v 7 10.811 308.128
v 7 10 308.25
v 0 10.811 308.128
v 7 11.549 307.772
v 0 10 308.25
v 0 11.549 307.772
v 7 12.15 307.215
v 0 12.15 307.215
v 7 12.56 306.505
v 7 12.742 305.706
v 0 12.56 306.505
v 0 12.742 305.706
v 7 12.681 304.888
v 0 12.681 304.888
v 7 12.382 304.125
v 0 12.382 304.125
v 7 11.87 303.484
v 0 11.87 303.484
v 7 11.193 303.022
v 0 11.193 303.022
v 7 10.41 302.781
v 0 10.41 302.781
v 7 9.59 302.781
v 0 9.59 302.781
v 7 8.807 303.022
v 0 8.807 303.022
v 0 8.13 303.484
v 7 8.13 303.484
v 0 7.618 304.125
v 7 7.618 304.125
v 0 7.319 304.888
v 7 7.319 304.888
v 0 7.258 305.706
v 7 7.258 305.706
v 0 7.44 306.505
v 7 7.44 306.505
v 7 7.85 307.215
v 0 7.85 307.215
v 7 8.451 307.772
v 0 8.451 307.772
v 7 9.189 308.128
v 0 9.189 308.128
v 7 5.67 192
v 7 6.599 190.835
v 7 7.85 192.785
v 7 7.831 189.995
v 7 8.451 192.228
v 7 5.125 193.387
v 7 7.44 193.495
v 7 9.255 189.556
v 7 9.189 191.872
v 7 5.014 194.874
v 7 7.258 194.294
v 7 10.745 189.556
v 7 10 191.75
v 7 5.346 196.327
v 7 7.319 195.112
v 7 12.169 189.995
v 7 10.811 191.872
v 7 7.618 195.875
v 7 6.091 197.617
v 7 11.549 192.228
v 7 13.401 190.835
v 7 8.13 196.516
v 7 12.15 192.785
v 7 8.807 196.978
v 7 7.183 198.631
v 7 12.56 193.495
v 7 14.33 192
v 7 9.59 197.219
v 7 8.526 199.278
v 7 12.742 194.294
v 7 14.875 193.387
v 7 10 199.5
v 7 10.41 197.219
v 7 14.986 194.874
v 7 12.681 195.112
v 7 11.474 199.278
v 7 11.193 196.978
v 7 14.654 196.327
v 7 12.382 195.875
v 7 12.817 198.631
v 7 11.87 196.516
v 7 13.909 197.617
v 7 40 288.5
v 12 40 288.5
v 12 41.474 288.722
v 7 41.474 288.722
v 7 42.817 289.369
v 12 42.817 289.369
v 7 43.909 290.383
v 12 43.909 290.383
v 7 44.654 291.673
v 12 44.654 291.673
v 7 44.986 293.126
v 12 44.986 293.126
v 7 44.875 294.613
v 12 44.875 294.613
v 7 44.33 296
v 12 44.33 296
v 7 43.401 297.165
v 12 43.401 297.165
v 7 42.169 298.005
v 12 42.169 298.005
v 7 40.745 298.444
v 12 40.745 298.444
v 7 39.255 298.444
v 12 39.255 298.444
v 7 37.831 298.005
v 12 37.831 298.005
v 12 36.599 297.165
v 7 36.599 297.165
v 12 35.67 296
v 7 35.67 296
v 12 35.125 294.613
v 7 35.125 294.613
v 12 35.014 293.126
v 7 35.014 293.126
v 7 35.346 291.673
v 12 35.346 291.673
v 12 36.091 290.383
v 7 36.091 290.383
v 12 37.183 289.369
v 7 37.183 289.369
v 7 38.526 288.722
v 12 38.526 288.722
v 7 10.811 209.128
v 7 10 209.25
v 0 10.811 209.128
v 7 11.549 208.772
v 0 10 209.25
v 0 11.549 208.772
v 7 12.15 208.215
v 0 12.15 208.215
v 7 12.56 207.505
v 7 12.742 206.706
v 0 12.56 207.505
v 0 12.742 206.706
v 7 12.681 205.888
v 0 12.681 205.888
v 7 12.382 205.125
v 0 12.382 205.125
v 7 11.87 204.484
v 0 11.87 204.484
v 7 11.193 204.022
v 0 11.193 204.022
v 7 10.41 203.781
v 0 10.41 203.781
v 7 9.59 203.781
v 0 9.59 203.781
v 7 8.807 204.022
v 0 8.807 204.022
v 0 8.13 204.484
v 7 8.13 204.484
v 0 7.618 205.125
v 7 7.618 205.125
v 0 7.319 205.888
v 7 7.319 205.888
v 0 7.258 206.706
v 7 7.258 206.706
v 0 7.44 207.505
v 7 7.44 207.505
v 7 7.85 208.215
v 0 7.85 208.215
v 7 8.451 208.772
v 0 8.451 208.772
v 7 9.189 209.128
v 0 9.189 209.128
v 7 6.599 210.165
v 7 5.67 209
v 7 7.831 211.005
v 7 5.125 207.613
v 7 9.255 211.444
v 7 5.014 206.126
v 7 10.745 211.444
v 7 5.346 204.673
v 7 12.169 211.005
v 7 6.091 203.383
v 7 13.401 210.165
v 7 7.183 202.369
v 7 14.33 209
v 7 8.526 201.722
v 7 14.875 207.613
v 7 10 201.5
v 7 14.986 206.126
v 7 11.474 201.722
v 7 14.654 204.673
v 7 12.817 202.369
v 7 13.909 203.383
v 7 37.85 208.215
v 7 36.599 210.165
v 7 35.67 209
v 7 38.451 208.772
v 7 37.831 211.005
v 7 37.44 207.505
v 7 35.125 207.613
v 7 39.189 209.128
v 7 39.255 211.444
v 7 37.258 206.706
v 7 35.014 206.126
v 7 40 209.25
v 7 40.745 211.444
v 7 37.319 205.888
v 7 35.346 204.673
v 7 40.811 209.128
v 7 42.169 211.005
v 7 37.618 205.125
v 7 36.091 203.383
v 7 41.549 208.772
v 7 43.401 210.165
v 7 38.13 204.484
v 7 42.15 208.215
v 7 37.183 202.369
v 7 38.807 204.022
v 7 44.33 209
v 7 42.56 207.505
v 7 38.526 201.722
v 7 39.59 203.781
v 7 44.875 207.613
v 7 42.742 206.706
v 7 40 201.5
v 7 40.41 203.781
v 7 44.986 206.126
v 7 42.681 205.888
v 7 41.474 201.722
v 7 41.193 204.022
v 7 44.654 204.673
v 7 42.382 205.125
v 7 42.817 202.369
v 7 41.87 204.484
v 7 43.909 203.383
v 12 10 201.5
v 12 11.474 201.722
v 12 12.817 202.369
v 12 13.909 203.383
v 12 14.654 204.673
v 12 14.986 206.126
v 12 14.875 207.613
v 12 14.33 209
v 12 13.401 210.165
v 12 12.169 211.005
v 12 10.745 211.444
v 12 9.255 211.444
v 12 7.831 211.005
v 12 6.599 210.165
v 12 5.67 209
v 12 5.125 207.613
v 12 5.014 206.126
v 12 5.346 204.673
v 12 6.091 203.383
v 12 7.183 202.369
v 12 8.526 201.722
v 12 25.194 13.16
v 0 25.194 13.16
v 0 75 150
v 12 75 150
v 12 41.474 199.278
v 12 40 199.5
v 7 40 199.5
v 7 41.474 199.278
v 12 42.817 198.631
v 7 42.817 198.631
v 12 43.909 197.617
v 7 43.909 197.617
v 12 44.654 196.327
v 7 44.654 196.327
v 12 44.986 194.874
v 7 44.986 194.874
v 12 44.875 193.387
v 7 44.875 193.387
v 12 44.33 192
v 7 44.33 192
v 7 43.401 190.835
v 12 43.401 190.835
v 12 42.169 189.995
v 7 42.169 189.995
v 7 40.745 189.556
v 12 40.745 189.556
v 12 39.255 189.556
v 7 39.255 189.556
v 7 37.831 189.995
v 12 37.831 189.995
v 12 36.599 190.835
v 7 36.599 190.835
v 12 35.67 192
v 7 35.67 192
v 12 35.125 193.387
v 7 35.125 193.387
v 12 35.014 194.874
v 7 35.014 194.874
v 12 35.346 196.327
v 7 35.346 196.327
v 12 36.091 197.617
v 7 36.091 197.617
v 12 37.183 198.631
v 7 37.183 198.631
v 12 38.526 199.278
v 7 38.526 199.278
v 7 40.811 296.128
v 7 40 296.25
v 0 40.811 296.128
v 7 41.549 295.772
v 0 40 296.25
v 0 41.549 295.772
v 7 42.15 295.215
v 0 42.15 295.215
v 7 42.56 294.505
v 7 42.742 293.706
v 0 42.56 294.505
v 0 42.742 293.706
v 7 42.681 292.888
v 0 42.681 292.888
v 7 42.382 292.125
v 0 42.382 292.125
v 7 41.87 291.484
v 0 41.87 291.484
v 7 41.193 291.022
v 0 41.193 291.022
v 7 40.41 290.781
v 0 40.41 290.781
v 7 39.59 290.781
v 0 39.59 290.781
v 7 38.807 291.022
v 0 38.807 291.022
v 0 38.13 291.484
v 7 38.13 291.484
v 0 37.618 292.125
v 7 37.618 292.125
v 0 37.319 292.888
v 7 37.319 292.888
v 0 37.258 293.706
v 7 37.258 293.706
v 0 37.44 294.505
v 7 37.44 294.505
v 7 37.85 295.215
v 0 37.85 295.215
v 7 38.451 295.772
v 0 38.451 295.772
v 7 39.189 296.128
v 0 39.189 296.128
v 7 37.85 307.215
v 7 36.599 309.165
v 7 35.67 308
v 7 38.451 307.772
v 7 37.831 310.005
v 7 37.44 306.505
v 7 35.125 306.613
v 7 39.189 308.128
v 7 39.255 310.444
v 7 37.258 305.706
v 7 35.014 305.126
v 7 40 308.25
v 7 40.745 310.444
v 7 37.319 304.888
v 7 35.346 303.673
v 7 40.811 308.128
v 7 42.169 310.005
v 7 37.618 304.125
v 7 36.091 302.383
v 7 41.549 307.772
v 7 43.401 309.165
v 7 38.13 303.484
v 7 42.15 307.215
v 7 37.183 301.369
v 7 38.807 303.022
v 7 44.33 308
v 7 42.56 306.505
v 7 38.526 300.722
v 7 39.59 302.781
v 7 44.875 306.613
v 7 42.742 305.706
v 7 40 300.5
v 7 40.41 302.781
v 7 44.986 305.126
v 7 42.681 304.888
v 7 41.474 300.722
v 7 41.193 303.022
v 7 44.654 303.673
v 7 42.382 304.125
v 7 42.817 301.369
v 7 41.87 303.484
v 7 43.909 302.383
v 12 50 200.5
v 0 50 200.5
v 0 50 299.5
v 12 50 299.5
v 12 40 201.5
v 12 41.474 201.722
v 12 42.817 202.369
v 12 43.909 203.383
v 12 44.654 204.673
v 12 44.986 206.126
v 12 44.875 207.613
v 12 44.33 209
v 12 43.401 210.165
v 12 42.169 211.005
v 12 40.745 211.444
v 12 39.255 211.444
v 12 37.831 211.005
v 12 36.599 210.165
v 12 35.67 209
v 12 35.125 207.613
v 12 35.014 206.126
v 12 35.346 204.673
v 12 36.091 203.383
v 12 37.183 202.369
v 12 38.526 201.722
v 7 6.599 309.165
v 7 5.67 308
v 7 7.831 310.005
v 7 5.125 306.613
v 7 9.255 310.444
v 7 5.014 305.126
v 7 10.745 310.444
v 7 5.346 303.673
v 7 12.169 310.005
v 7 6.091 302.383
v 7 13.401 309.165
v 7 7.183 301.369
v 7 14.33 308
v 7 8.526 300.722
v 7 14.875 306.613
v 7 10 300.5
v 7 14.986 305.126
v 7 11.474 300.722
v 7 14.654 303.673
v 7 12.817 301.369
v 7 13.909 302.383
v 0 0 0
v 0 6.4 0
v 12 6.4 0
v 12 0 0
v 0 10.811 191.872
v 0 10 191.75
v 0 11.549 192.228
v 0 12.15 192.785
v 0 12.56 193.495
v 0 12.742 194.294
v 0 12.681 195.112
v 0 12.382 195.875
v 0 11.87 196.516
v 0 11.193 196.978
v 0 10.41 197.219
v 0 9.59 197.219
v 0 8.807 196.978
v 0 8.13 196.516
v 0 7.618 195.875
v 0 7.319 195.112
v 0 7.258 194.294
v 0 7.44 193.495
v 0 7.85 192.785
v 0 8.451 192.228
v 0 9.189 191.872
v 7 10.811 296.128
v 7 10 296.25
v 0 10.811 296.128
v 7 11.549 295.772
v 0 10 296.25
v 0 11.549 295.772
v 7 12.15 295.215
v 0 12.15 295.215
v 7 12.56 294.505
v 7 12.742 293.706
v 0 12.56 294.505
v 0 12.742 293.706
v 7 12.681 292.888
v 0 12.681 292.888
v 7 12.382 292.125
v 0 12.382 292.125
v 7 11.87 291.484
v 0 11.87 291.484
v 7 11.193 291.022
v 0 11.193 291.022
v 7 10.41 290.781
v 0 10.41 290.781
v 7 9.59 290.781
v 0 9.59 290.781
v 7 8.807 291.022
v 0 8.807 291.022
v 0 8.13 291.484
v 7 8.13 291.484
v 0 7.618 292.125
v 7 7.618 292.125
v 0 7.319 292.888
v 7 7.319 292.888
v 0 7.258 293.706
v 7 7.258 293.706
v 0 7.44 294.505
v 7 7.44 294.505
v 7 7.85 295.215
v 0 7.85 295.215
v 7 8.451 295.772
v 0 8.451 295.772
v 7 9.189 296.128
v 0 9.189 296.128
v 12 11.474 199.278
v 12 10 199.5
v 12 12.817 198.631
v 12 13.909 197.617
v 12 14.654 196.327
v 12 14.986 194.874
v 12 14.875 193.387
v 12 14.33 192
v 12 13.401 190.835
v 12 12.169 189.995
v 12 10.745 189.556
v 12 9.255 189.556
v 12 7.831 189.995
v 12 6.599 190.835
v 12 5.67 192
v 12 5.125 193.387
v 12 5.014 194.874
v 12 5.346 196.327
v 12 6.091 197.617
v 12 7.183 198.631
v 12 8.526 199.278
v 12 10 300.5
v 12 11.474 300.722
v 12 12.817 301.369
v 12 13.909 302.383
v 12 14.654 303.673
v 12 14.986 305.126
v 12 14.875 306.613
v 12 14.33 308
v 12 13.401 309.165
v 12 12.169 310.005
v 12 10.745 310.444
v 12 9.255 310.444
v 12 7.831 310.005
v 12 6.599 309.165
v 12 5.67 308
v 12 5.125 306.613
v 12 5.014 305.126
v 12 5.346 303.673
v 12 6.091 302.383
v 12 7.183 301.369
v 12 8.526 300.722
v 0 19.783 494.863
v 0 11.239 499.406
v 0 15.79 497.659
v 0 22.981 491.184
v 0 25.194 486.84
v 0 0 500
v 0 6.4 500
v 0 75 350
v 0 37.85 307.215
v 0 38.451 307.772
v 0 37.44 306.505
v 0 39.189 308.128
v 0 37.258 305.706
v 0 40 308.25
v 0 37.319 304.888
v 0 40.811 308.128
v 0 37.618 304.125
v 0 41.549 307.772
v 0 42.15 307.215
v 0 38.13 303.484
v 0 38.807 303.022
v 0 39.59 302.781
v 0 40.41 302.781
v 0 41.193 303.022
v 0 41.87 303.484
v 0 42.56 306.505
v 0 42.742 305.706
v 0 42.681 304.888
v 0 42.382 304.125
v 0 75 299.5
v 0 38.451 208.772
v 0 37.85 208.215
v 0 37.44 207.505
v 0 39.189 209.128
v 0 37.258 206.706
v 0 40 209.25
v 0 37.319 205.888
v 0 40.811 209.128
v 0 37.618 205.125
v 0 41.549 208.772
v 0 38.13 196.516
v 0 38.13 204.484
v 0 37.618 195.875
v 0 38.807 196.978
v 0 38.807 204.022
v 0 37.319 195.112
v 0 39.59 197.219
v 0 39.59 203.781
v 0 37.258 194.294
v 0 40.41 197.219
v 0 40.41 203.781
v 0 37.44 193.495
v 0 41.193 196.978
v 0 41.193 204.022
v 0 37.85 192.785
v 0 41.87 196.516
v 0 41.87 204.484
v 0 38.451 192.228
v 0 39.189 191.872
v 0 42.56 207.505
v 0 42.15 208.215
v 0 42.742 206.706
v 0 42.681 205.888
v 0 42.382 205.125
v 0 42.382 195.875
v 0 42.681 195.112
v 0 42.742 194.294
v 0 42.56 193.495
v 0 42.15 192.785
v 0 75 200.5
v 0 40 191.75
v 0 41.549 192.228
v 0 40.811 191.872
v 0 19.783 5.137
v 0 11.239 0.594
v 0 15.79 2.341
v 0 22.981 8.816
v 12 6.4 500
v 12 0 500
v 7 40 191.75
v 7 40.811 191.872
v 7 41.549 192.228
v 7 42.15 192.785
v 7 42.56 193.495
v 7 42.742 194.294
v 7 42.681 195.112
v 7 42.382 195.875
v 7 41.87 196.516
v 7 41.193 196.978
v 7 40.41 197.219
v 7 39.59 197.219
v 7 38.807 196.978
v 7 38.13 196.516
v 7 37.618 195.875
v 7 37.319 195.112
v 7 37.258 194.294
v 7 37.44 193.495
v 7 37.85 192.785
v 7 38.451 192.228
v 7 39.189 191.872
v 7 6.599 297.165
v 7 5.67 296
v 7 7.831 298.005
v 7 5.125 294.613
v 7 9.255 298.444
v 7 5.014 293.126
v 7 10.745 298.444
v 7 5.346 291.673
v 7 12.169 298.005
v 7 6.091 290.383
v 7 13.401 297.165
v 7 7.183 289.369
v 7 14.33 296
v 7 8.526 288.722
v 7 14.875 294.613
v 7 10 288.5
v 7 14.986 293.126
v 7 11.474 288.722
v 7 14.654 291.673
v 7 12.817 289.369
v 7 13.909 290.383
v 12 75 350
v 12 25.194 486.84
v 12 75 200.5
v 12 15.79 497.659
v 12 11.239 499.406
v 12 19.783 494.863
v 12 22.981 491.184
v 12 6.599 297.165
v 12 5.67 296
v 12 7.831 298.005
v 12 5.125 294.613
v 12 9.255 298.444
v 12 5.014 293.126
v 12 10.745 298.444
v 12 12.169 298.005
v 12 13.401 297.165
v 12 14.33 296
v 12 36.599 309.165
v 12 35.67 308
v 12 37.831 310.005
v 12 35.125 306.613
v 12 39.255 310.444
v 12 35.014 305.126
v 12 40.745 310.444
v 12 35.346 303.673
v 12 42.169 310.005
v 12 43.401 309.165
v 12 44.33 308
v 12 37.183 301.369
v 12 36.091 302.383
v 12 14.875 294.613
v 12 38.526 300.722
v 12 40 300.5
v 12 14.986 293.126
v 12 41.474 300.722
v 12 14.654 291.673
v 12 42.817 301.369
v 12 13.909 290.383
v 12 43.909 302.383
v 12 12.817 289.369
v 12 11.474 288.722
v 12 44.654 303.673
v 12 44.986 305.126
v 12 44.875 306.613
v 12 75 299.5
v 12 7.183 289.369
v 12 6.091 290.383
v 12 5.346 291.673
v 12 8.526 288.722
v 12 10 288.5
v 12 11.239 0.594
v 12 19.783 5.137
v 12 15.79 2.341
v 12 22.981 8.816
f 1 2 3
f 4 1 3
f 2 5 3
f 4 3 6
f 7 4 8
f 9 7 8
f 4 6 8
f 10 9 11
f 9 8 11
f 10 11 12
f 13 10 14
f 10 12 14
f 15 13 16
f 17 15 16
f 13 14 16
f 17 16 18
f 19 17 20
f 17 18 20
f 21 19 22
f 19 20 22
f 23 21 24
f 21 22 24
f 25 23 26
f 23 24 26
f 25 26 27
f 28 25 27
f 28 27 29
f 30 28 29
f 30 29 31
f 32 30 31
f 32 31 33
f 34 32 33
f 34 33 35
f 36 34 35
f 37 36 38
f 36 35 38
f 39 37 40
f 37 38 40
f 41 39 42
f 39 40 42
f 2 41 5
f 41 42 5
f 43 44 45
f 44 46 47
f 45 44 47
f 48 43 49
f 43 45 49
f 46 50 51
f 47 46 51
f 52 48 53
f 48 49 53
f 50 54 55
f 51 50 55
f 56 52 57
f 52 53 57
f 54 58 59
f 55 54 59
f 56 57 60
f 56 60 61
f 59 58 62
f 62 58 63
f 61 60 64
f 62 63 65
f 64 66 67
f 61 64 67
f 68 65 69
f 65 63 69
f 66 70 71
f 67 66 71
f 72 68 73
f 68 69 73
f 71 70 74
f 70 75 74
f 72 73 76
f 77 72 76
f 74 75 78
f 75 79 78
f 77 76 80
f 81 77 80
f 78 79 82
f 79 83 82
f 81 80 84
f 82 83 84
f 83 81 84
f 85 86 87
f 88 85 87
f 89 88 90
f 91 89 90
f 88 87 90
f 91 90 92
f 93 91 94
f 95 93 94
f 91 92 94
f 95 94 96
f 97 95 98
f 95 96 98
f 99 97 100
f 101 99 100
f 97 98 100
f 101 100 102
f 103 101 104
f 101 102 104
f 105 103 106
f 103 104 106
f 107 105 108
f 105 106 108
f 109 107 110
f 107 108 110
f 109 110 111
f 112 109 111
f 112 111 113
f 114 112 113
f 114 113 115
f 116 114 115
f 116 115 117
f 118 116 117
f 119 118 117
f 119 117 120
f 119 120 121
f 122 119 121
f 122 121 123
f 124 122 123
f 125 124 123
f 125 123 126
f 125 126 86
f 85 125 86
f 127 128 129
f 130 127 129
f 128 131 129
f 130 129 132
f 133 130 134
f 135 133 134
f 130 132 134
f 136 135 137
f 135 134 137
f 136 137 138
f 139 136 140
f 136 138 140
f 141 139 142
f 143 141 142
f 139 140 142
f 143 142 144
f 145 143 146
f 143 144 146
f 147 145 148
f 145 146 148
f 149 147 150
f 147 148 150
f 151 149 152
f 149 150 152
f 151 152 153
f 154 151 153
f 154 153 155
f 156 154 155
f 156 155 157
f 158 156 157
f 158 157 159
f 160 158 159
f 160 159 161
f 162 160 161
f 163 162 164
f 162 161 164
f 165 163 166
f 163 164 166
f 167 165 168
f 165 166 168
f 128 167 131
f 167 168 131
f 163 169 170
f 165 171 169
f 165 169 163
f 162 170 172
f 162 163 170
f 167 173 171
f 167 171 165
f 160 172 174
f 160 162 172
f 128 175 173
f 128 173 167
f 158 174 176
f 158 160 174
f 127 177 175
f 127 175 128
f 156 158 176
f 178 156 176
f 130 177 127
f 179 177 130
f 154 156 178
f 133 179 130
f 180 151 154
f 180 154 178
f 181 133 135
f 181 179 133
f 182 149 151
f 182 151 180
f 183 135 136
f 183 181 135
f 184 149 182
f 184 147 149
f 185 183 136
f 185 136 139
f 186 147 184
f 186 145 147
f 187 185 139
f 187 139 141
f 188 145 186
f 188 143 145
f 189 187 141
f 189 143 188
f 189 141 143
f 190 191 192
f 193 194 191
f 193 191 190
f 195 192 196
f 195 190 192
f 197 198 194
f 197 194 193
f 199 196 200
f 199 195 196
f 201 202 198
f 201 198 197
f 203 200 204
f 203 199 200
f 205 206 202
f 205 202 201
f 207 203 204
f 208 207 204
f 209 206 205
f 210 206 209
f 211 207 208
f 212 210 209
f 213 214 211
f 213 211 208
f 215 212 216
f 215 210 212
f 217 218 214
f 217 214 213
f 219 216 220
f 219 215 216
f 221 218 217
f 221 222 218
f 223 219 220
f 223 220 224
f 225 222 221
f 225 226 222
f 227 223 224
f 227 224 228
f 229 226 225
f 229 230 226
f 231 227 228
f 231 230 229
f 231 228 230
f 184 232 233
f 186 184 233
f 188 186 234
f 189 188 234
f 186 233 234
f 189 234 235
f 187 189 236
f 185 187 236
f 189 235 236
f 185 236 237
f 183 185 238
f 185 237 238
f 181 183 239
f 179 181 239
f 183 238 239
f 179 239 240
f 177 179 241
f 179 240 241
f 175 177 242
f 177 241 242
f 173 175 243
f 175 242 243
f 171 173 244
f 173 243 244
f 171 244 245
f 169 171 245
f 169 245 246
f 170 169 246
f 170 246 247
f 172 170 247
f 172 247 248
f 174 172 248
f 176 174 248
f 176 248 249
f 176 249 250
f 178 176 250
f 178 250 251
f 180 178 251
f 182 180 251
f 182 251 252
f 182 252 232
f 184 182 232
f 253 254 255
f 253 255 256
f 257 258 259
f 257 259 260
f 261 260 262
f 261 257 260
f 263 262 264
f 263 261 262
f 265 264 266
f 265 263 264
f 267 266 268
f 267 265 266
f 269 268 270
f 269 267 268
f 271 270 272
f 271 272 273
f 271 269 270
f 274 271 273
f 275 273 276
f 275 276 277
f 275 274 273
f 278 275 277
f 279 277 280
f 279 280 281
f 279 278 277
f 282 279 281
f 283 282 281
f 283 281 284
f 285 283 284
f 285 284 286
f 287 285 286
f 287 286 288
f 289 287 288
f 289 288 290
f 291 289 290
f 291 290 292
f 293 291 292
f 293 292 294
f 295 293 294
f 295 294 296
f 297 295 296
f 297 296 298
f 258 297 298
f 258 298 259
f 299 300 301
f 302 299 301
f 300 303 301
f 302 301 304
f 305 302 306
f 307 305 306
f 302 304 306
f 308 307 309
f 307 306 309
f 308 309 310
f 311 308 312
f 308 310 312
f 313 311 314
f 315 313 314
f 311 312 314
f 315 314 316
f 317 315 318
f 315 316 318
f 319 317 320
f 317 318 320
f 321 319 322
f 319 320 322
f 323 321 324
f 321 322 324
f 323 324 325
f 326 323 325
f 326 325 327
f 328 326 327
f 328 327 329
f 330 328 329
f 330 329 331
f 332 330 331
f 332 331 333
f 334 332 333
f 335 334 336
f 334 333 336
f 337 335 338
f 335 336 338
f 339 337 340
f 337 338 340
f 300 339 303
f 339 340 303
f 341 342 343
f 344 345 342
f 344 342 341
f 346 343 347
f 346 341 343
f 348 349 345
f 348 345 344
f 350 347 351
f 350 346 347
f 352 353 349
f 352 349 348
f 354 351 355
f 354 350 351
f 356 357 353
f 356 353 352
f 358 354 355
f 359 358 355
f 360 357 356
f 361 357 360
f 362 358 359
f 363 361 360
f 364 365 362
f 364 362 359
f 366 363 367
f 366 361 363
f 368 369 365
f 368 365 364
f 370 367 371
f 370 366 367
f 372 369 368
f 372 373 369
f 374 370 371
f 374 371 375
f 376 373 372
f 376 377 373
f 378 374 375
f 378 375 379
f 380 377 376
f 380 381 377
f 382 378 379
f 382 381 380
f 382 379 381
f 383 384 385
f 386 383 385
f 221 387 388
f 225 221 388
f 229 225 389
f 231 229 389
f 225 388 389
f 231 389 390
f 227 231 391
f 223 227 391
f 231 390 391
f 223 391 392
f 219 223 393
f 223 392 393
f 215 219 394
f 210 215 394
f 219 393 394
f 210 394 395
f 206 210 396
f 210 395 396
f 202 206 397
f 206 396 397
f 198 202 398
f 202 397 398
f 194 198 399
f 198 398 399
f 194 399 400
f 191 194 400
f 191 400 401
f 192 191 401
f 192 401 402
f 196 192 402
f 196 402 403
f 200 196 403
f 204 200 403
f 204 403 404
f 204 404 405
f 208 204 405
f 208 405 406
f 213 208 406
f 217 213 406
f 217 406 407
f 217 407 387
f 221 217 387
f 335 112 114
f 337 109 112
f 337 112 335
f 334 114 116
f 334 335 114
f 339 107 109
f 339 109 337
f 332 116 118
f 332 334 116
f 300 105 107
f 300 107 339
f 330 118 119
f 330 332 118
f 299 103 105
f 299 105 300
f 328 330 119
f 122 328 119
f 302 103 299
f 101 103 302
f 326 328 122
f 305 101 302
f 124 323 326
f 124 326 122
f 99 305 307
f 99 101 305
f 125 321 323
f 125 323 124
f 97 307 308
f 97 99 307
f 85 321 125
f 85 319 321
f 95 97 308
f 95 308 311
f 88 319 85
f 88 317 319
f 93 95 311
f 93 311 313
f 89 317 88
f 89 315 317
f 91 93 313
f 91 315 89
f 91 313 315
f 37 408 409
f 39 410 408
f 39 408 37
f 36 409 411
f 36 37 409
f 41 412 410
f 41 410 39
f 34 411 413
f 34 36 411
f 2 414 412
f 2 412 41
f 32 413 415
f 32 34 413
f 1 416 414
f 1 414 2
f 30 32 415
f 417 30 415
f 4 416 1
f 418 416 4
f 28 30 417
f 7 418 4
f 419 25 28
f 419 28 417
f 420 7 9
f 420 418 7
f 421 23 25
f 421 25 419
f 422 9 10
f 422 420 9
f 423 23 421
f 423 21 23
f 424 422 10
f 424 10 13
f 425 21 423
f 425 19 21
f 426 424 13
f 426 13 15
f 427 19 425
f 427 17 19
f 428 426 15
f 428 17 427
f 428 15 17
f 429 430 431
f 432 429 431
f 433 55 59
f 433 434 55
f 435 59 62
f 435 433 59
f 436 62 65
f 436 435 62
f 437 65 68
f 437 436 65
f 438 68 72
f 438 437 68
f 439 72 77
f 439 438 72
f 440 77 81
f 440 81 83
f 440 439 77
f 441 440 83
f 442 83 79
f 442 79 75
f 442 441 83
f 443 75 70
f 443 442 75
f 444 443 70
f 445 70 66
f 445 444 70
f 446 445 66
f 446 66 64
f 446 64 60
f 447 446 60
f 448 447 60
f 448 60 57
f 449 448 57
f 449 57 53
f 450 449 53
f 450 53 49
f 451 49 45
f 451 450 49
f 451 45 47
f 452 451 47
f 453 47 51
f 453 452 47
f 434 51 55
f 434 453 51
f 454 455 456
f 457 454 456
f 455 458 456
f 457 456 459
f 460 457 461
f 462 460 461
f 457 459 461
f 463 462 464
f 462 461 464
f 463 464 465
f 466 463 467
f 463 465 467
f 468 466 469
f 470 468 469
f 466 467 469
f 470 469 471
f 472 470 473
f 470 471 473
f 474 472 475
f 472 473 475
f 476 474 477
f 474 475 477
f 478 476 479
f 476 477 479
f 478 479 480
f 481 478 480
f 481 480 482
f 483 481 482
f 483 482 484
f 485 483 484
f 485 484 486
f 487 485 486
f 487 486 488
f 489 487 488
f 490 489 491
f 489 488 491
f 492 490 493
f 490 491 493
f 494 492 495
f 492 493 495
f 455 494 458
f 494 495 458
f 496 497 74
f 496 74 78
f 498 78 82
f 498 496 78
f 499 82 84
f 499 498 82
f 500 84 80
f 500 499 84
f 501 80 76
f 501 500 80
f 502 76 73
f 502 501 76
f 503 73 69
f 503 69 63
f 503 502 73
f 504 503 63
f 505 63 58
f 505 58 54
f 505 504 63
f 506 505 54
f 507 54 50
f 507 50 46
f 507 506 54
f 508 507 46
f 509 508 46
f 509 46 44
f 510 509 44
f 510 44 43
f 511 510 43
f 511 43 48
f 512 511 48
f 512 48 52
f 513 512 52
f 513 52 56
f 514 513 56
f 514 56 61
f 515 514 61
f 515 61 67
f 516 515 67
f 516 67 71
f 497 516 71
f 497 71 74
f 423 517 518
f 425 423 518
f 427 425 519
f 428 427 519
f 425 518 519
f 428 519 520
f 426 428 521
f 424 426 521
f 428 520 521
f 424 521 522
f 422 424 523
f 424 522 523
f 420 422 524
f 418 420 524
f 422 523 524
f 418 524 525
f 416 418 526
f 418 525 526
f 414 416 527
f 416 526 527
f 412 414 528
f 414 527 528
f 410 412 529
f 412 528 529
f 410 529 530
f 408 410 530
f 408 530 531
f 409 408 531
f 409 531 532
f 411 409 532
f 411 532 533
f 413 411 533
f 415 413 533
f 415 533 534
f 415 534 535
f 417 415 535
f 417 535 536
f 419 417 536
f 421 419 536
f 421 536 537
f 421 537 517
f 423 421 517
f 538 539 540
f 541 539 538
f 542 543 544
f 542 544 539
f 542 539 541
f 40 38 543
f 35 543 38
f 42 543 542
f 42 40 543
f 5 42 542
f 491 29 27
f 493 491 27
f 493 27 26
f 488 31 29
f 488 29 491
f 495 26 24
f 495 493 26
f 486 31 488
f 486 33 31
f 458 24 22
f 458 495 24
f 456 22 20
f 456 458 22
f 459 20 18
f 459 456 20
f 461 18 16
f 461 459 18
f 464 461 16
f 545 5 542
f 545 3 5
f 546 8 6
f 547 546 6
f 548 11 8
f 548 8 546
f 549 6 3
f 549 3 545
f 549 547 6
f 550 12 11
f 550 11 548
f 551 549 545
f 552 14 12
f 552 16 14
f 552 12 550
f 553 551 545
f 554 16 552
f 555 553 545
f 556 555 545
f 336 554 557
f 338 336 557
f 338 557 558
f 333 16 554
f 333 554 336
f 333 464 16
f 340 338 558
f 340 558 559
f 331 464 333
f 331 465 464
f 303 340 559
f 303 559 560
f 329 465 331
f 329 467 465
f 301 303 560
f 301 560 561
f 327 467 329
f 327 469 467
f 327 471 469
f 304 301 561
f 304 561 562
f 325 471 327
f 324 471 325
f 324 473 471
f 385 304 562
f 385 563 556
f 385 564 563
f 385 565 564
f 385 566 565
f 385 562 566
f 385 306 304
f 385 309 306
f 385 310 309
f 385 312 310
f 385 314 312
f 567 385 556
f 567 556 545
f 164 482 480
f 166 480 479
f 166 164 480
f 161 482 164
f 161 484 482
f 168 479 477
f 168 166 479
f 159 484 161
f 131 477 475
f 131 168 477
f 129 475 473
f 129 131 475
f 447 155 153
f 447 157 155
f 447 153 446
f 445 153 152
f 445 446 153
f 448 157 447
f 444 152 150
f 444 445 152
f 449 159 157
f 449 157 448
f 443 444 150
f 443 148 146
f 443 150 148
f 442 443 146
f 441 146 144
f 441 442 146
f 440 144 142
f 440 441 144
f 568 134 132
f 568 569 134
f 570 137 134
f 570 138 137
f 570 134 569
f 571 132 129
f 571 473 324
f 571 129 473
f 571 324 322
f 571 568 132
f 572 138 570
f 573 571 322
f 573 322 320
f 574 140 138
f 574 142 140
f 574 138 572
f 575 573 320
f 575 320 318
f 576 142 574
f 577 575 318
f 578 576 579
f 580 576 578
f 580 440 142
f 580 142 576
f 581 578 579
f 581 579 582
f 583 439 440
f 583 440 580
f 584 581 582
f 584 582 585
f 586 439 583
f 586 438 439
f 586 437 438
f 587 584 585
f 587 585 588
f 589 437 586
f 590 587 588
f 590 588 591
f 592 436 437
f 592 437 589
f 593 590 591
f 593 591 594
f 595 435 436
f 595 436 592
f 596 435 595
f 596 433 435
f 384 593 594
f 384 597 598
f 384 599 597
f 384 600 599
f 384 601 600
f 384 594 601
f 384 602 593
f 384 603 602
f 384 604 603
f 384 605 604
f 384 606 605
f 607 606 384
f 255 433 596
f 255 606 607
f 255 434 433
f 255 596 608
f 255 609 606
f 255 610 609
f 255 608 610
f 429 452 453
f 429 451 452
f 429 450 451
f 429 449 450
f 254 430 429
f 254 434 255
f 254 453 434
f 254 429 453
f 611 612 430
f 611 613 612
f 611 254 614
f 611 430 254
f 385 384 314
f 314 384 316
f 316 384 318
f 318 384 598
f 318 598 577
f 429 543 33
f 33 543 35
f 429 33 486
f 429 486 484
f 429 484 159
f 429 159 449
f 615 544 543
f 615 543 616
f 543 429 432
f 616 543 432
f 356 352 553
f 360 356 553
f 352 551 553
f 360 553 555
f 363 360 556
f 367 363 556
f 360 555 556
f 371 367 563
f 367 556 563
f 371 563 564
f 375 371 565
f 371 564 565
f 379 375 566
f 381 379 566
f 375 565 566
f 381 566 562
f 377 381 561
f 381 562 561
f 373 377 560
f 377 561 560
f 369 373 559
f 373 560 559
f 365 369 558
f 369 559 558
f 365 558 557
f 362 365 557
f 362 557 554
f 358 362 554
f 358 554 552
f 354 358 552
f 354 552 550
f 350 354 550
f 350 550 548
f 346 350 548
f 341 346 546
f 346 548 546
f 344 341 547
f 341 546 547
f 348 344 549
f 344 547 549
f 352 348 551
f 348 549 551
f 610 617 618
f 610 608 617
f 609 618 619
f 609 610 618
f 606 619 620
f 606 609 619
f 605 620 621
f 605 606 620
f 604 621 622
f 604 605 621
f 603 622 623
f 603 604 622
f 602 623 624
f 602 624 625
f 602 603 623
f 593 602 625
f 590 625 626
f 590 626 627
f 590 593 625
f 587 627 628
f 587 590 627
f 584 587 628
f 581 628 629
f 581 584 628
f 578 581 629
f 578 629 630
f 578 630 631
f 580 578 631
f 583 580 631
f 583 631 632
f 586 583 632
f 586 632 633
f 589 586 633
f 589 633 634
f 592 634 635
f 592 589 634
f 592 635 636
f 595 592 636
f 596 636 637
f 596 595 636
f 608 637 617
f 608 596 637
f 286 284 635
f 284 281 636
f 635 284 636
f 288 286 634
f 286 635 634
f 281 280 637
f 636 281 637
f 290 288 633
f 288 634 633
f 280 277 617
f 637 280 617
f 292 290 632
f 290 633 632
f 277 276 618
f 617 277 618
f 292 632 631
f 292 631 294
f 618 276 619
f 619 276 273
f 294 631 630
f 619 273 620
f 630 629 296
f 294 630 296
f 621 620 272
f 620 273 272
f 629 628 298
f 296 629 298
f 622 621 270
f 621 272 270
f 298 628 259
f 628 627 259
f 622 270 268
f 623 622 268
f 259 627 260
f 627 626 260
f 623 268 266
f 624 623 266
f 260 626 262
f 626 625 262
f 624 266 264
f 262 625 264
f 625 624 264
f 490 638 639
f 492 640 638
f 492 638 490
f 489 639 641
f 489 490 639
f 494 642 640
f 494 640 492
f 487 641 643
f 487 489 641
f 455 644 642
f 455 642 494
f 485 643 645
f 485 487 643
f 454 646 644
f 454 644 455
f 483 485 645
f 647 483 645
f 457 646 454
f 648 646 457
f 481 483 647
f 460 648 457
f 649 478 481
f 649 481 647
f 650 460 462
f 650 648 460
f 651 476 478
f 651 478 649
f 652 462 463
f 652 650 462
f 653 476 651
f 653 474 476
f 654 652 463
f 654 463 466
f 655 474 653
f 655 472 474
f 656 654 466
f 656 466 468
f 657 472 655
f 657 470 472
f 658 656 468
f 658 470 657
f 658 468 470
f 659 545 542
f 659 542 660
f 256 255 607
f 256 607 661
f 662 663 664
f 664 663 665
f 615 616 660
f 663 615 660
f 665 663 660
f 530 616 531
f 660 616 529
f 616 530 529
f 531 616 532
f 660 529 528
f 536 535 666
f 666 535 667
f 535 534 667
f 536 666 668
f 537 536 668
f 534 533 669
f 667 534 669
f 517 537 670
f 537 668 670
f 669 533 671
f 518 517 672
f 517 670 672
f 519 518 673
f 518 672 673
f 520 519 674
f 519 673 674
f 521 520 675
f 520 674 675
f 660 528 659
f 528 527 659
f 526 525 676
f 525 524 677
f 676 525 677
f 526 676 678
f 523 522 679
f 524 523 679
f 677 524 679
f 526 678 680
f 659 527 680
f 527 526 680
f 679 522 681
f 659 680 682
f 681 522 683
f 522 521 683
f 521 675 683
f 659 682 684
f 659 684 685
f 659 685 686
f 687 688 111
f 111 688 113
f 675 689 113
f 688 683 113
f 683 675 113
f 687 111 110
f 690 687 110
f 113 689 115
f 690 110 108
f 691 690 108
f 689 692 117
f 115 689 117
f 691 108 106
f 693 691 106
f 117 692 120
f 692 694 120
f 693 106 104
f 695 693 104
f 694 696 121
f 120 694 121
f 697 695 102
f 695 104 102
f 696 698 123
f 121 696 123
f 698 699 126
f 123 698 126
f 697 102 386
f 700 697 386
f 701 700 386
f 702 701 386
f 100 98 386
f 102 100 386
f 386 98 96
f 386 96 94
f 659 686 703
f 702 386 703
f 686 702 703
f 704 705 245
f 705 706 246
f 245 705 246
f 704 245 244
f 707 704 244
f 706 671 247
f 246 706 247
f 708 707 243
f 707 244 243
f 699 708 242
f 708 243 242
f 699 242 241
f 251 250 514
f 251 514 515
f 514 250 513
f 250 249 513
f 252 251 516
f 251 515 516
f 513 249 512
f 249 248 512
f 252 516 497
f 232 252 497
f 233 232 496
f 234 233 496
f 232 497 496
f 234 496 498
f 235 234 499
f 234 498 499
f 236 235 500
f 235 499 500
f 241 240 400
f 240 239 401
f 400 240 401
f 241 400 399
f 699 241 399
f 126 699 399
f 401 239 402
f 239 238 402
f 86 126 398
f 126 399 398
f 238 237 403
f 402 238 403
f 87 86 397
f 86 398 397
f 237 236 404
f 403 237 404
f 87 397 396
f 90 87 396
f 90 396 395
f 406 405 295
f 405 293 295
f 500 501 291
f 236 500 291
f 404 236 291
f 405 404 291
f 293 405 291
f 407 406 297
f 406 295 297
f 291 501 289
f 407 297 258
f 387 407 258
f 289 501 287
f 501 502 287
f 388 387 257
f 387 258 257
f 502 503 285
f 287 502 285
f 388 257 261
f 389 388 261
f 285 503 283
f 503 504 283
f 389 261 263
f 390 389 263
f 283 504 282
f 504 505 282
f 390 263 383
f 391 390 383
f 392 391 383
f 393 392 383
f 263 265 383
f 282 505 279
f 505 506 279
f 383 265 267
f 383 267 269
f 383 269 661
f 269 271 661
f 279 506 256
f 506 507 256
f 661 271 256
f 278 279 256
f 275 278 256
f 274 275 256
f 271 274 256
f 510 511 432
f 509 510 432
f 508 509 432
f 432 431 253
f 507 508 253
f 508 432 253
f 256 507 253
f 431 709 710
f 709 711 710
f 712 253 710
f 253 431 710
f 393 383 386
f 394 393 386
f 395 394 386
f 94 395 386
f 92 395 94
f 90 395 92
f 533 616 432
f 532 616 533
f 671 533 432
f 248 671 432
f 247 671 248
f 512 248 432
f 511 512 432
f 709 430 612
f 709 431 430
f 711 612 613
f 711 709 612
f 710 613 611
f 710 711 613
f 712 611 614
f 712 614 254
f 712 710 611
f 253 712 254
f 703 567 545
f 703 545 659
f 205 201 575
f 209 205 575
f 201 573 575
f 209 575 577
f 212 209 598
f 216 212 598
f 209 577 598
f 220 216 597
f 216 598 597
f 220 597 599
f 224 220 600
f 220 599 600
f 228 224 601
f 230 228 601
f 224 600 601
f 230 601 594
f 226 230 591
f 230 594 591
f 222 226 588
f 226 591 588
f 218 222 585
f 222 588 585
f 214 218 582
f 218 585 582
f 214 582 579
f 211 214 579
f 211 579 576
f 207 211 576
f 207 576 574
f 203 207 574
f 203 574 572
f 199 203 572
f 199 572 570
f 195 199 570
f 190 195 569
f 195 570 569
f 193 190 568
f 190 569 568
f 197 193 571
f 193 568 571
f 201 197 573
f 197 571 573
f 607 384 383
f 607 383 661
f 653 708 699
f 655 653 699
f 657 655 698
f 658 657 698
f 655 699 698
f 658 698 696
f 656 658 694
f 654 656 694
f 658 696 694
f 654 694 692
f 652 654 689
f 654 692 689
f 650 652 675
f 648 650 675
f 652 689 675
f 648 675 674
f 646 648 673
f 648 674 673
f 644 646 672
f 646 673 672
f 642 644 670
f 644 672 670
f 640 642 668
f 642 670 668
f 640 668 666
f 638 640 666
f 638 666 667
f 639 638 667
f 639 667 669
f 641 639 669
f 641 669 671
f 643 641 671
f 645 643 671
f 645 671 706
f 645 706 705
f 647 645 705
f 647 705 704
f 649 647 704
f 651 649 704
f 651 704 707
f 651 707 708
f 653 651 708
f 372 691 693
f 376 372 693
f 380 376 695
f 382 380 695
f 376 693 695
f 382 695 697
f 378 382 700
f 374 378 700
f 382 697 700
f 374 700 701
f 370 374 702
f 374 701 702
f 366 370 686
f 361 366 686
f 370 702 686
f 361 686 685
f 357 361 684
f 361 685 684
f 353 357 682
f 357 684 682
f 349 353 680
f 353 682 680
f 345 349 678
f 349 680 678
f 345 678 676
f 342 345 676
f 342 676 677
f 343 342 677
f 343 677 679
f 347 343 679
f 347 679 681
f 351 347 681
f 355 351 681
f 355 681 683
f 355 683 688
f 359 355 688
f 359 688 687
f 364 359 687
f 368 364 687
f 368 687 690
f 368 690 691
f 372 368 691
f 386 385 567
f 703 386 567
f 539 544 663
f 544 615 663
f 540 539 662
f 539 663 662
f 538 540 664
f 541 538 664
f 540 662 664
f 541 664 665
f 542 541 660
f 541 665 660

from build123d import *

# Parameters (mm, degrees)
SKETCH1_W                               = 12
SKETCH1_H                               = 75
BASE_DEPTH                              = 500
SKETCH2_W                               = 99
SKETCH2_H                               = 25
LAP_JOINT_CUTOUT_DEPTH                  = 506.736097189
LAP_JOINT_BOLT_HOLE_PATTERN_D           = 5.5
LAP_JOINT_BOLT_HOLE_PATTERN_CBORE_D     = 10
LAP_JOINT_BOLT_HOLE_PATTERN_CBORE_DEPTH = 5
CHAMFER_FRONT_SIZE                      = 150
CHAMFER_FRONT_SIZE2                     = 54.59553514
CHAMFER_REAR_SIZE                       = 150
CHAMFER_REAR_SIZE2                      = 54.59553514
BREAK_CHAMFER_CORNERS_R                 = 20
CROSS_TIE_BOLT_HOLE_PATTERN_D           = 5.5
CROSS_TIE_BOLT_HOLE_PATTERN_CBORE_D     = 10
CROSS_TIE_BOLT_HOLE_PATTERN_CBORE_DEPTH = 5


with BuildPart() as part:
    # Sketch1 → base (new body)
    with BuildSketch(Plane.XY):
        with Locations((6, 37.5)):
            Rectangle(SKETCH1_W, SKETCH1_H)
    extrude(amount=BASE_DEPTH)

    # Sketch2 → lap joint cutout (cut, through all)
    with BuildSketch(Plane.ZY):
        with Locations((250, 62.5)):
            Rectangle(SKETCH2_W, SKETCH2_H)
    extrude(amount=-LAP_JOINT_CUTOUT_DEPTH, mode=Mode.SUBTRACT)

    # lap joint bolt hole pattern (through all)
    with Locations(Plane(origin=(12, 0, 0), x_dir=(0, 0, -1), z_dir=(1, 0, 0))):
        with Locations((-293.5, 40), (-206.5, 10), (-293.5, 10), (-206.5, 40)):
            CounterBoreHole(LAP_JOINT_BOLT_HOLE_PATTERN_D / 2, LAP_JOINT_BOLT_HOLE_PATTERN_CBORE_D / 2, LAP_JOINT_BOLT_HOLE_PATTERN_CBORE_DEPTH)

    # chamfer front
    chamfer_front_edges = [part.edges().sort_by_distance(p)[0] for p in [
        (6, 75, 0),
    ]]
    chamfer_front_side = [part.faces().sort_by_distance(p)[0] for p in [
        (6, 75, 100.25),
    ]]
    chamfer(chamfer_front_edges, length=CHAMFER_FRONT_SIZE, length2=CHAMFER_FRONT_SIZE2, reference=chamfer_front_side[0])

    # chamfer rear
    chamfer_rear_edges = [part.edges().sort_by_distance(p)[0] for p in [
        (6, 75, 500),
    ]]
    chamfer_rear_side = [part.faces().sort_by_distance(p)[0] for p in [
        (6, 75, 399.75),
    ]]
    chamfer(chamfer_rear_edges, length=CHAMFER_REAR_SIZE, length2=CHAMFER_REAR_SIZE2, reference=chamfer_rear_side[0])

    # break chamfer corners
    break_chamfer_corners_edges = [part.edges().sort_by_distance(p)[0] for p in [
        (6, 20.40446486, 0),
        (6, 20.40446486, 500),
    ]]
    fillet(break_chamfer_corners_edges, radius=BREAK_CHAMFER_CORNERS_R)

    # cross tie bolt hole pattern (through all)
    with Locations(Plane(origin=(12, 0, 0), x_dir=(0, 0, -1), z_dir=(1, 0, 0))):
        with Locations((-305.5, 40), (-305.5, 10)):
            cross_tie_bolt_hole_pattern = CounterBoreHole(CROSS_TIE_BOLT_HOLE_PATTERN_D / 2, CROSS_TIE_BOLT_HOLE_PATTERN_CBORE_D / 2, CROSS_TIE_BOLT_HOLE_PATTERN_CBORE_DEPTH)

    # mirror cross tie bolt hole pattern: cross tie bolt hole pattern across plane
    add(cross_tie_bolt_hole_pattern.mirror(Plane(origin=(0, 0, 250), x_dir=(1, 0, 0), z_dir=(0, 0, -1))), mode=Mode.SUBTRACT)


solid = part.part
